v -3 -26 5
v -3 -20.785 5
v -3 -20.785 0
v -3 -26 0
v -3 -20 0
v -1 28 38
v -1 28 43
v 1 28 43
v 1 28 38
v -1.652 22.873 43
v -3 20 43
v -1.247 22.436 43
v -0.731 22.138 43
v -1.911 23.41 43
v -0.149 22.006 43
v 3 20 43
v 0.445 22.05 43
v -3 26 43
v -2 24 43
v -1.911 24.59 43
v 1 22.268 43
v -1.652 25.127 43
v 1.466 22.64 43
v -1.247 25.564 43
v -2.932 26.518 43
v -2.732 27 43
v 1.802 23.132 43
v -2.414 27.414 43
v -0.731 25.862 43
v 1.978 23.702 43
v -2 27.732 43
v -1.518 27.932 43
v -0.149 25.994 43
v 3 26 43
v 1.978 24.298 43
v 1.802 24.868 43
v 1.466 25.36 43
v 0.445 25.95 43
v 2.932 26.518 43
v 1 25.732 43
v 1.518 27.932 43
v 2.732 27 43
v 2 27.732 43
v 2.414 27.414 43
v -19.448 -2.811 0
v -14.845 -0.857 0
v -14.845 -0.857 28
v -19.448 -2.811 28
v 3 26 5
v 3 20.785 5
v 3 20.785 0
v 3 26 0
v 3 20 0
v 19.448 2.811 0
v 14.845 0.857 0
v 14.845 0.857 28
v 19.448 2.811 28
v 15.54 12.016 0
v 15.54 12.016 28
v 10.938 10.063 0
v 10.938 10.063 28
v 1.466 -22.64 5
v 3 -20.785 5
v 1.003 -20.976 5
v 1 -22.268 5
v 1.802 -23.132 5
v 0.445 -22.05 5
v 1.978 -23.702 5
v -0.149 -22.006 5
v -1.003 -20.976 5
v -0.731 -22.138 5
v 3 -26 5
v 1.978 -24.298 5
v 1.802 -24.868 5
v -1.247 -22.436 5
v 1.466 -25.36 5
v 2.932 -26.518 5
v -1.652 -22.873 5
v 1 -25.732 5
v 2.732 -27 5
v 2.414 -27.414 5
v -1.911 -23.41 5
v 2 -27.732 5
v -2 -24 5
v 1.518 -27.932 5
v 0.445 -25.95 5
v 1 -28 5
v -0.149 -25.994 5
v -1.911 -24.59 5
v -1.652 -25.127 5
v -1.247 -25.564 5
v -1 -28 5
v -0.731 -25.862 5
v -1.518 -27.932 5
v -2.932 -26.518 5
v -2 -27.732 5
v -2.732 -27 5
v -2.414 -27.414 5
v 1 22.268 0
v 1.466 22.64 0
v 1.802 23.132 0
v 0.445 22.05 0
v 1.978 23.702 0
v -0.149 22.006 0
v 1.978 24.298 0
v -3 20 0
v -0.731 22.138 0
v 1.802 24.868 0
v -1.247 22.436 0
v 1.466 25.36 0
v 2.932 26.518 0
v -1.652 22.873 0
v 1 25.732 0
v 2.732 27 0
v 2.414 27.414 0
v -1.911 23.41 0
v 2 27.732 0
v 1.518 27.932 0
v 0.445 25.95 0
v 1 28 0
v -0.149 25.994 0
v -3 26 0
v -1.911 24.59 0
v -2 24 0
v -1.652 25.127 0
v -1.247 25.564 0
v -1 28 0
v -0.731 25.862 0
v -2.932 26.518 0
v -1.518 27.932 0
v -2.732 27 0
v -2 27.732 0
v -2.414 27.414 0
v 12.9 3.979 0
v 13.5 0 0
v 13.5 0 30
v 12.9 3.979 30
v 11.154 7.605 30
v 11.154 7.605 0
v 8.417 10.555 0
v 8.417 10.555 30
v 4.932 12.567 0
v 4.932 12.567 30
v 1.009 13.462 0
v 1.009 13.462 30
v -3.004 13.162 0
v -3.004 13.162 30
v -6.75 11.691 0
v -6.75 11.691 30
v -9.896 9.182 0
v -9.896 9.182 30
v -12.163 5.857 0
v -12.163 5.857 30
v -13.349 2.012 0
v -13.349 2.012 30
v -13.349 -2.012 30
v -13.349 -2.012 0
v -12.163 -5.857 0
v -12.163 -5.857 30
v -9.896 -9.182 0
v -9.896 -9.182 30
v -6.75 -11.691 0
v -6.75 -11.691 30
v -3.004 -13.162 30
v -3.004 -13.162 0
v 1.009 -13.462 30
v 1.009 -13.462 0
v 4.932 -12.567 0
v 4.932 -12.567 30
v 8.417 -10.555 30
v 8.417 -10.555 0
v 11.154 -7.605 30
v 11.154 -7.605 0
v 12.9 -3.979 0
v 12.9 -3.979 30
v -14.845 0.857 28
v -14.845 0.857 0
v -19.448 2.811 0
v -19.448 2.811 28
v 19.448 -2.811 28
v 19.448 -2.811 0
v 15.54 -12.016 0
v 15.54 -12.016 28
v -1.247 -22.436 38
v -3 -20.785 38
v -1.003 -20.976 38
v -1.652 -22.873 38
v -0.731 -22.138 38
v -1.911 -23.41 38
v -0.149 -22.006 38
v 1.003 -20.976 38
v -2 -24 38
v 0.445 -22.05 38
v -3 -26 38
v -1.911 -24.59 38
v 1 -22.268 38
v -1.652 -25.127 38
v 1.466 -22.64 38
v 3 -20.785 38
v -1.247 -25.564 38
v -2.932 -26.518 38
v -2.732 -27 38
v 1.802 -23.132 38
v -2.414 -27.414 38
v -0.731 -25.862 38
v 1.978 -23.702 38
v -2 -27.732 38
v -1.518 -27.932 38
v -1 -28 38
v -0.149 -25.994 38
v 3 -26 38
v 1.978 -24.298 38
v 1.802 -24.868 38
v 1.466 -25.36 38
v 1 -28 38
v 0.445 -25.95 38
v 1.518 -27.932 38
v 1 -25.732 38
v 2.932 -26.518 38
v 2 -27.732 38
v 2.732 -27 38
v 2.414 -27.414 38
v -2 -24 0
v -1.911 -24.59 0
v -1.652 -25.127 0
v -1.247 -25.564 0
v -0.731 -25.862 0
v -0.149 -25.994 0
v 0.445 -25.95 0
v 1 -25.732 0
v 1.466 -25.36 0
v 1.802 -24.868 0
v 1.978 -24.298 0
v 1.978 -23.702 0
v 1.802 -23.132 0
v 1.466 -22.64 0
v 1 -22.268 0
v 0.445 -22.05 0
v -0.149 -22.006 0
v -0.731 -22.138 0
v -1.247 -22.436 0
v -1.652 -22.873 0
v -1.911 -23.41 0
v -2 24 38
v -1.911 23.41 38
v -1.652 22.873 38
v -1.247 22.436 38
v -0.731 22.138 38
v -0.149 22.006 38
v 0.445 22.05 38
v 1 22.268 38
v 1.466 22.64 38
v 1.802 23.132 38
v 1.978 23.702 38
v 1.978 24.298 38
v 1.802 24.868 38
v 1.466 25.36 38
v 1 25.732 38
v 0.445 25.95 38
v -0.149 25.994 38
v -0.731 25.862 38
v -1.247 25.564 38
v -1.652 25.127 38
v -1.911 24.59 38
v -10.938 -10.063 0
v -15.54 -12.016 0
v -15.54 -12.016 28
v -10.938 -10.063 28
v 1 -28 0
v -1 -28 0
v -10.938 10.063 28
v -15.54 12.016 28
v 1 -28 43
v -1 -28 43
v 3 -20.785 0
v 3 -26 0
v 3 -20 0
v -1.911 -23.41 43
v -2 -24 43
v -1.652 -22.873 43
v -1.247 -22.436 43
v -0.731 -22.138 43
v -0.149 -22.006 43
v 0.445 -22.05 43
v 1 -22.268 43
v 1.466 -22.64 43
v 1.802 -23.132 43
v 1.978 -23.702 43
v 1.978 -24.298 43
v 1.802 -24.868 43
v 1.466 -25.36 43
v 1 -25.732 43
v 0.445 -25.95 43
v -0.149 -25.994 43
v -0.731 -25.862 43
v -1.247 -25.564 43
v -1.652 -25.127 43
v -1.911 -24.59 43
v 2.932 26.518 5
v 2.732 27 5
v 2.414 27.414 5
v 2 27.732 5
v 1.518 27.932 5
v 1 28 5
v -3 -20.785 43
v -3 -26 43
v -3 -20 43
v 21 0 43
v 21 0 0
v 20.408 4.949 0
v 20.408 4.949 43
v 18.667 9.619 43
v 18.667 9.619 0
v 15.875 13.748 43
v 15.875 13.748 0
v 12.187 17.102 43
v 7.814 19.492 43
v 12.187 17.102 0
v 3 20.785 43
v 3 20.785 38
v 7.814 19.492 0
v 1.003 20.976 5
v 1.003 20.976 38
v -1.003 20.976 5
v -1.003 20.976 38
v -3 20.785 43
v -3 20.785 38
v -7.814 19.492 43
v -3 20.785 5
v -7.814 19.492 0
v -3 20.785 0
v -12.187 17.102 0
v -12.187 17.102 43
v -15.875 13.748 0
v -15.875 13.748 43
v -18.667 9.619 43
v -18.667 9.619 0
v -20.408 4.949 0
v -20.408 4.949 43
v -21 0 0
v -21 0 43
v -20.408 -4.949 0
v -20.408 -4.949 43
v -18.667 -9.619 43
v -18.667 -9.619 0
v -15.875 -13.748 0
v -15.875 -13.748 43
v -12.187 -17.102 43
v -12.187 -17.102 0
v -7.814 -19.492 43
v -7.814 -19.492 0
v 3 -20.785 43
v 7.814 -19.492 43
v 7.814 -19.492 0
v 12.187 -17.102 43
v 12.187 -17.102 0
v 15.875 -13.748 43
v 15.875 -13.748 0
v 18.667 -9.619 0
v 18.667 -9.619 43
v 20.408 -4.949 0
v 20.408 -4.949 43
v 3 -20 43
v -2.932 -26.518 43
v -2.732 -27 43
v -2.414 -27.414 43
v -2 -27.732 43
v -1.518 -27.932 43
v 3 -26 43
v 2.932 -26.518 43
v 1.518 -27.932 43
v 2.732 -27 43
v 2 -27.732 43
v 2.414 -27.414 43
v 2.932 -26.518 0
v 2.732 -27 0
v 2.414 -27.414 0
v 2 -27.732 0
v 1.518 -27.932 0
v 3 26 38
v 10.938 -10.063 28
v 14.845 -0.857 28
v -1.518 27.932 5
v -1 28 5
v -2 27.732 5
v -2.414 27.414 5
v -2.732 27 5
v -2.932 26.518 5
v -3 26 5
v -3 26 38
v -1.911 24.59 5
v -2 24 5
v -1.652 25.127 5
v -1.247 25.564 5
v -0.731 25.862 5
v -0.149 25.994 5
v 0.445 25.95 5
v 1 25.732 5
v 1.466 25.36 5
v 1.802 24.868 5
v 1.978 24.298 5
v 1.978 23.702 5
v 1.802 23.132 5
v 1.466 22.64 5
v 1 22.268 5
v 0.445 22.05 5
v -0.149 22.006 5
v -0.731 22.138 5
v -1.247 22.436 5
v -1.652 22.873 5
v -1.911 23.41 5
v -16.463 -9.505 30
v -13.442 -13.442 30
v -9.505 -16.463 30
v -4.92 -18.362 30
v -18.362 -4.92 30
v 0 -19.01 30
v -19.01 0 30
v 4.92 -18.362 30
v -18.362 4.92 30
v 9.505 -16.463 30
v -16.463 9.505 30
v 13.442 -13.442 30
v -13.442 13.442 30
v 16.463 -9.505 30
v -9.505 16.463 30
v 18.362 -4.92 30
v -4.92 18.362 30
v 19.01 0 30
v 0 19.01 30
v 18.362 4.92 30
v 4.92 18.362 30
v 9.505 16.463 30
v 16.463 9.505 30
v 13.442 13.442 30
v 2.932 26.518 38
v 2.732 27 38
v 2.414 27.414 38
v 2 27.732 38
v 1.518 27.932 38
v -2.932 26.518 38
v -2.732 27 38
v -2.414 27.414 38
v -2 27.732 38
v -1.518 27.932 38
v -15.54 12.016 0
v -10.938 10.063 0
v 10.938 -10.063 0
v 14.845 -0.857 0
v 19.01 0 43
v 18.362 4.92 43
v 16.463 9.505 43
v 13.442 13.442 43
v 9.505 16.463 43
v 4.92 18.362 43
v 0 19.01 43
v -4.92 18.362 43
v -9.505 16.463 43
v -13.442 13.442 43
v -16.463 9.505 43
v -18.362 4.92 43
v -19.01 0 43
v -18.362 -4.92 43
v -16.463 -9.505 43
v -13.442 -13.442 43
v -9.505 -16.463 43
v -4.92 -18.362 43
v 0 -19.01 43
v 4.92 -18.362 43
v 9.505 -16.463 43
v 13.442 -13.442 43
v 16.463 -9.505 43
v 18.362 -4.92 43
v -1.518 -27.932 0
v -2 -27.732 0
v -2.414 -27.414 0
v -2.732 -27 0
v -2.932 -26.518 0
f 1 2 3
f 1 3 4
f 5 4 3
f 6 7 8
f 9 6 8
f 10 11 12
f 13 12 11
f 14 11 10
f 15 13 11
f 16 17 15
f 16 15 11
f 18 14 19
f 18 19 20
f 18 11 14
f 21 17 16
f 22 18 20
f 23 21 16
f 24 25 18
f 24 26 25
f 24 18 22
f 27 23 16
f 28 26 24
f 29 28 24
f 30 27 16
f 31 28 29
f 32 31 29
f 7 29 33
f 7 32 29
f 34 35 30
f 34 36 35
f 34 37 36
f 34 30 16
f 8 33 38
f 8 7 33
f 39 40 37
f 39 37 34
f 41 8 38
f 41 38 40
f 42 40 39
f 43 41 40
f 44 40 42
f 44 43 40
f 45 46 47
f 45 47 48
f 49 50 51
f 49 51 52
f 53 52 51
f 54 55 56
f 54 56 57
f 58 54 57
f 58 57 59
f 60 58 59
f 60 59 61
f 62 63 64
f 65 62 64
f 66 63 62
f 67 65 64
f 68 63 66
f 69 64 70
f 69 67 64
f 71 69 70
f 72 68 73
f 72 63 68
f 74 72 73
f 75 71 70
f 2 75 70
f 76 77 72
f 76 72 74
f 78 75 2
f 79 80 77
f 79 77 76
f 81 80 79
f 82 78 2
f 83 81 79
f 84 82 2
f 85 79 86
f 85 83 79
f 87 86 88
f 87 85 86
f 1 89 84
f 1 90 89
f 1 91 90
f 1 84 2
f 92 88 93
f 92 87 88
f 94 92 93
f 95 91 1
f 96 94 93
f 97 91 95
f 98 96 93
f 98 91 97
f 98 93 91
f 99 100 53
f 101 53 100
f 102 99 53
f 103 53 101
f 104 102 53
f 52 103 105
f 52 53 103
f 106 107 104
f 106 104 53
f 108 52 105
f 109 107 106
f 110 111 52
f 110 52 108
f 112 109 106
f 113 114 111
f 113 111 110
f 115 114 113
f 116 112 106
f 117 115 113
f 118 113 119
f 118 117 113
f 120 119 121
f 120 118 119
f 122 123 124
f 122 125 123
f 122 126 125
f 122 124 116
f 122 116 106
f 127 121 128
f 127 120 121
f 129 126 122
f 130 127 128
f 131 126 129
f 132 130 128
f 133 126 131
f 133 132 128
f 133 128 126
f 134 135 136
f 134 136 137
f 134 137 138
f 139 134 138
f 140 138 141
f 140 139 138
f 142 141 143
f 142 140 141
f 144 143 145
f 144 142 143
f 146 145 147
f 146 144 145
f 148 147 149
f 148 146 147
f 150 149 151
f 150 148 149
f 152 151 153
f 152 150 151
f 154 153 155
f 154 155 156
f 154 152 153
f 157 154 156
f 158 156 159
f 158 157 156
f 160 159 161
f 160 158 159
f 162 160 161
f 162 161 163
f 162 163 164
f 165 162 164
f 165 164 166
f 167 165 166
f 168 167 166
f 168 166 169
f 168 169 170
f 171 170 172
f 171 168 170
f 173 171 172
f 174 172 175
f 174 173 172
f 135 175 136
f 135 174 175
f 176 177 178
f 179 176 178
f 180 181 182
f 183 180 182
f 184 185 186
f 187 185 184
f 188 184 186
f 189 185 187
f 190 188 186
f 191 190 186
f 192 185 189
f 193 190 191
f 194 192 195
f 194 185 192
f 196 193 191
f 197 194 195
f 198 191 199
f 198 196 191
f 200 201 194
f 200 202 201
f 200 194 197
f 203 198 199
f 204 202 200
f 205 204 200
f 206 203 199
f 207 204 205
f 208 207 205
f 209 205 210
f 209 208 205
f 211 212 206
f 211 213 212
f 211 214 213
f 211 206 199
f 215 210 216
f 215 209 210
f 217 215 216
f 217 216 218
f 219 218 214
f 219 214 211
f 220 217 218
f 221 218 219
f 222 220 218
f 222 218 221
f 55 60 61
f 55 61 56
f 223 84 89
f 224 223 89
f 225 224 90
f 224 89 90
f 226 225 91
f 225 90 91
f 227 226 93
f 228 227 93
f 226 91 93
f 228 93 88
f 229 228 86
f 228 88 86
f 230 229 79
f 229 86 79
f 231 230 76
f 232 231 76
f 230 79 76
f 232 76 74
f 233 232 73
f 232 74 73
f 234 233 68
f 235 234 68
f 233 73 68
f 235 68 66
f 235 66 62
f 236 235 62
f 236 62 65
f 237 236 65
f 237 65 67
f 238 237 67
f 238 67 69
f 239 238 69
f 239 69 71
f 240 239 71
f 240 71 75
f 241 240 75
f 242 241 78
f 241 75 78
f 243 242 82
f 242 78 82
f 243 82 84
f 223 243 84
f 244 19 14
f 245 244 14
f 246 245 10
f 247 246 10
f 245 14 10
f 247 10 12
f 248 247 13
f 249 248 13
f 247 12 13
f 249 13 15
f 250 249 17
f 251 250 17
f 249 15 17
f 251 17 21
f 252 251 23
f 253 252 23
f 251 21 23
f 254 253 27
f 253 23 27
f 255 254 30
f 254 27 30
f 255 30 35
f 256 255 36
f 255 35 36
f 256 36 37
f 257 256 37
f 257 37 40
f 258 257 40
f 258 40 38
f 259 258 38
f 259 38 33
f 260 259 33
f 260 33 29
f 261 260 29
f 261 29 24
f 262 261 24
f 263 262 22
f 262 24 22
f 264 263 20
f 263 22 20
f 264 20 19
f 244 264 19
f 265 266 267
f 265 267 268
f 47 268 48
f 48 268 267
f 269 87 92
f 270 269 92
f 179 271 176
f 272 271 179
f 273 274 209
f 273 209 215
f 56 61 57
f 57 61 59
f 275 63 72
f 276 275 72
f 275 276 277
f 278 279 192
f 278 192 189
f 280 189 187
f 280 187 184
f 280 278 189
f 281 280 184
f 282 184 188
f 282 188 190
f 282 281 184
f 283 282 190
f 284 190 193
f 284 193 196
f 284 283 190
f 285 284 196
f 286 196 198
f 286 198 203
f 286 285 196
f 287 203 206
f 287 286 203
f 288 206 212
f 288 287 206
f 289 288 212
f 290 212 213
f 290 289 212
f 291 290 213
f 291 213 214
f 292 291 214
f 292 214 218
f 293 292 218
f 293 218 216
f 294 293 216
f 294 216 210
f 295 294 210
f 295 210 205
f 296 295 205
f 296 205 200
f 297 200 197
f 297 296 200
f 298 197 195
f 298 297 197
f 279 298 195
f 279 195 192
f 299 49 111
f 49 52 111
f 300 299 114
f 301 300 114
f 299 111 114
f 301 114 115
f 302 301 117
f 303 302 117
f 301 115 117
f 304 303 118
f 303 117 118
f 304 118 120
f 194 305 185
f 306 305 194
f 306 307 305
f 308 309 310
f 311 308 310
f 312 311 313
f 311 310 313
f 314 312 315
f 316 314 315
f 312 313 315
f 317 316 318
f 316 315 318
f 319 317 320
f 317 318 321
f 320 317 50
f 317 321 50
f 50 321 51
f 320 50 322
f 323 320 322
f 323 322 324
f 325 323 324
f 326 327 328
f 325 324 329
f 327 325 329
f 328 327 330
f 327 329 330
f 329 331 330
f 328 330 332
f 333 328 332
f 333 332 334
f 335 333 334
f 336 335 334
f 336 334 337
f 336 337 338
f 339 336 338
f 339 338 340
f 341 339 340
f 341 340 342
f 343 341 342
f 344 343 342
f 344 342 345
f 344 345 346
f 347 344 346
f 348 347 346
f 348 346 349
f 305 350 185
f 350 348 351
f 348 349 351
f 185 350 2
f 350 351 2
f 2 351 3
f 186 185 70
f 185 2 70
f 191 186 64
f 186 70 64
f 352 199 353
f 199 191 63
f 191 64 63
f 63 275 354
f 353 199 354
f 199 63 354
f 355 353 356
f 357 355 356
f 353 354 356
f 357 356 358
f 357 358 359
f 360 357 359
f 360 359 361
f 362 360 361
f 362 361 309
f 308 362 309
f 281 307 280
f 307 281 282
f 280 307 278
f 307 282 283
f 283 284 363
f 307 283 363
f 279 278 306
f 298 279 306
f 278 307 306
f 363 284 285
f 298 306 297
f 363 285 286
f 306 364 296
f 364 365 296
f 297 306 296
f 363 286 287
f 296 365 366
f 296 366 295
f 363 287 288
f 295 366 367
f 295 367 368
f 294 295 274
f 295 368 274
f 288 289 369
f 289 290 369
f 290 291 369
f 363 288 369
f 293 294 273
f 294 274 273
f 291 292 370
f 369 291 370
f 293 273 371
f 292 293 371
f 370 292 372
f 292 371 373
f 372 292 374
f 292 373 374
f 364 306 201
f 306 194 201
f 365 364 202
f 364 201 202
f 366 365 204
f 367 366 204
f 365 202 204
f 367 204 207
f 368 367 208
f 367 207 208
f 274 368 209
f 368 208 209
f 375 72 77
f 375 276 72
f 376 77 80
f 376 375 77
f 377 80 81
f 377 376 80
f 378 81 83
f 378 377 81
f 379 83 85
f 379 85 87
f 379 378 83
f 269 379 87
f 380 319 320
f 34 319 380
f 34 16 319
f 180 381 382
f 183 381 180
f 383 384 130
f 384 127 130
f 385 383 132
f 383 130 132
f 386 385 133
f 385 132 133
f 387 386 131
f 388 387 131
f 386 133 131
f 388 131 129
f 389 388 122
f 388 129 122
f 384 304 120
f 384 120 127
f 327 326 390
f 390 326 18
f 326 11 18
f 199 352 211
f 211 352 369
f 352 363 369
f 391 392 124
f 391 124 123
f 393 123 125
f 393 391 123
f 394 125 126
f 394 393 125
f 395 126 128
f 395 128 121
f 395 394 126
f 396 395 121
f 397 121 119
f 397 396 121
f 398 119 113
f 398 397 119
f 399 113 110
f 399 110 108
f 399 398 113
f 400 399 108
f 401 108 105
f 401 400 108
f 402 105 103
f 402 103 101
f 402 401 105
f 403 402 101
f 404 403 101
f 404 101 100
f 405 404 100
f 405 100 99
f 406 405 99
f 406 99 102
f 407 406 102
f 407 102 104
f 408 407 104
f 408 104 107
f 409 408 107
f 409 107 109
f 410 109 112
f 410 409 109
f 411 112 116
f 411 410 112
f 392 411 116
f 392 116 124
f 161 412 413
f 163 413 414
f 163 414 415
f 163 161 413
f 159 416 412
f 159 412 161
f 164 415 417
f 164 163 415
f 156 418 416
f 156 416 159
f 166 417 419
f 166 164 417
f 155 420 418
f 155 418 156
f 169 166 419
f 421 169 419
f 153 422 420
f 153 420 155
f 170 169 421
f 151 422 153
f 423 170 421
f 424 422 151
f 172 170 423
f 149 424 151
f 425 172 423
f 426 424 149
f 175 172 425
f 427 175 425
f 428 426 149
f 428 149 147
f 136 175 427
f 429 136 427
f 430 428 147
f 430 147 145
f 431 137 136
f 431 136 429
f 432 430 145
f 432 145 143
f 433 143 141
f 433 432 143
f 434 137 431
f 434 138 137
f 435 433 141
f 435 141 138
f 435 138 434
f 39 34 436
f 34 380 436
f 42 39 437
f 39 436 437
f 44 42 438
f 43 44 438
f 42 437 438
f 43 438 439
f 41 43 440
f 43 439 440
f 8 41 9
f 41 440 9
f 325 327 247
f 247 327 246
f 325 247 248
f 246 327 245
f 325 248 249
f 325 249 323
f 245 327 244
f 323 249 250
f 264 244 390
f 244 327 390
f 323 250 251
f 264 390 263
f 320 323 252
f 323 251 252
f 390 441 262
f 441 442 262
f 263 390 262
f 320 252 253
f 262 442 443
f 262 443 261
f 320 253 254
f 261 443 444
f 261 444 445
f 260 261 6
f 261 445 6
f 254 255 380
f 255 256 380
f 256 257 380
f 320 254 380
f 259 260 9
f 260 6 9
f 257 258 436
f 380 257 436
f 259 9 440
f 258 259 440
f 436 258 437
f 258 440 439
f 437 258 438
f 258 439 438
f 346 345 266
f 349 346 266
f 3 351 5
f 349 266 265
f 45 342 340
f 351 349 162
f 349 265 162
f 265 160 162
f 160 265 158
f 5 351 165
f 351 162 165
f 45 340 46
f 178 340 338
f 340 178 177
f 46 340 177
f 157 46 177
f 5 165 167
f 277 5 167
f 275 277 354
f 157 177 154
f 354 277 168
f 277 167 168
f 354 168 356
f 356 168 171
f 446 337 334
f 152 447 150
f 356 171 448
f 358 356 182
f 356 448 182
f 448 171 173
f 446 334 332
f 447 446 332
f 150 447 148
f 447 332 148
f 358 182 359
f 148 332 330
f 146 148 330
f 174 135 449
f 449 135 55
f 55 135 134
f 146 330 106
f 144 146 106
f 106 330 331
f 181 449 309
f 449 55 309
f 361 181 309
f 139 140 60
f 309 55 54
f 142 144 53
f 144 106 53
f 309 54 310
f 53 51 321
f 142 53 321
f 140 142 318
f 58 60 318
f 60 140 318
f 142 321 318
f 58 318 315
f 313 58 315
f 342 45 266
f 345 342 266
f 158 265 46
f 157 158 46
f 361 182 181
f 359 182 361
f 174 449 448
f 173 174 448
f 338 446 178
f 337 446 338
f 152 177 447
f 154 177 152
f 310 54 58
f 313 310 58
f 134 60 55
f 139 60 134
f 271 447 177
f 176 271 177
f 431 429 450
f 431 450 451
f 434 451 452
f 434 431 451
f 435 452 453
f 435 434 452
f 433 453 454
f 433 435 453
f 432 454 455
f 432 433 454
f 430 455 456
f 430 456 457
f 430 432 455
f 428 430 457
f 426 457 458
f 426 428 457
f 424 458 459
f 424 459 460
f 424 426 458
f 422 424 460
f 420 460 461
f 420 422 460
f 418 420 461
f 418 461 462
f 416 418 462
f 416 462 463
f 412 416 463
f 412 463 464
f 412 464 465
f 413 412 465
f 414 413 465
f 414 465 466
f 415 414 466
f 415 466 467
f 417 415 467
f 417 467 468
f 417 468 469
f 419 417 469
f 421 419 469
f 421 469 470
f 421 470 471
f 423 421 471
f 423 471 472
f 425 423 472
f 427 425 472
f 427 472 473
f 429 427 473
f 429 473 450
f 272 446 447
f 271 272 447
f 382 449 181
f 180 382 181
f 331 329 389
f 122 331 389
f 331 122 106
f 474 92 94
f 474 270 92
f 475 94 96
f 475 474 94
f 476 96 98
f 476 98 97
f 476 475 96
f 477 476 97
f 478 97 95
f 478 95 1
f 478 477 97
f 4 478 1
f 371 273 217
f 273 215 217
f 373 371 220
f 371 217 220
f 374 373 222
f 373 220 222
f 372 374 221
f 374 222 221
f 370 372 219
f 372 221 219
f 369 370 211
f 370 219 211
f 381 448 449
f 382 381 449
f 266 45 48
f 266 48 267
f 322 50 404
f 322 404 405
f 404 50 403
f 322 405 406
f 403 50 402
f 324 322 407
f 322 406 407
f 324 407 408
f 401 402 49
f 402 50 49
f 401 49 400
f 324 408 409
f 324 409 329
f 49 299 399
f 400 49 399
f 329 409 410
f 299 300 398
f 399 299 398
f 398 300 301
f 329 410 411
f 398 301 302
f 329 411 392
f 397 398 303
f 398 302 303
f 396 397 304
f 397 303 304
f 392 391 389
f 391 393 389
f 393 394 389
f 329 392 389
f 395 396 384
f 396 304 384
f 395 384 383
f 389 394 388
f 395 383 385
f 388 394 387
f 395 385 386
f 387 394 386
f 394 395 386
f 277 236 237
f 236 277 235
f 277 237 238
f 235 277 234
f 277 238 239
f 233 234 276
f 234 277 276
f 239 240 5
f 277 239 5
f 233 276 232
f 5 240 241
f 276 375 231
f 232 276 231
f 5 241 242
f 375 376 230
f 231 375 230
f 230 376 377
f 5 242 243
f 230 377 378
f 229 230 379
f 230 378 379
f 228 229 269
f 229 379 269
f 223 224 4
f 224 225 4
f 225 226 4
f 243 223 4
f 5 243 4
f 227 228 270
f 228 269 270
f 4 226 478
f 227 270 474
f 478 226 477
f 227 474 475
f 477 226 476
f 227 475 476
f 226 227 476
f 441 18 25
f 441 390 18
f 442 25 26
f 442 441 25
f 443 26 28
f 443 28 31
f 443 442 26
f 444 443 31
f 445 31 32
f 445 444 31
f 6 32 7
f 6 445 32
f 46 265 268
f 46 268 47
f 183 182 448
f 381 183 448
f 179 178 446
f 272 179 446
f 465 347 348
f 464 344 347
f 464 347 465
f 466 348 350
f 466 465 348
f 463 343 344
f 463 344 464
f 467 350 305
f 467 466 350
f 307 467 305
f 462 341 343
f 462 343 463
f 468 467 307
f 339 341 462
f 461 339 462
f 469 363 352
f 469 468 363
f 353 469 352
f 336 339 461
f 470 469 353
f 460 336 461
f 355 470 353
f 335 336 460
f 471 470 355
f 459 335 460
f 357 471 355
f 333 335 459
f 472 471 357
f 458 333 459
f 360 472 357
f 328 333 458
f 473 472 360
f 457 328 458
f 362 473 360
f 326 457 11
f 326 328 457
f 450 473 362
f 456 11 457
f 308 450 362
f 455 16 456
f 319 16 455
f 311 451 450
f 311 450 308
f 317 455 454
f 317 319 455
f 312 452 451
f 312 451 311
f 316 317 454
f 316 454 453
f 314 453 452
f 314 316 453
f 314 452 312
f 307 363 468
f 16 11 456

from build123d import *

# Parameters (mm, degrees)
SKETCH1_R                = 19.01
SKETCH1_R_2              = 13.5
BOSS_EXTRUDE1_DEPTH      = 30
BOSS_EXTRUDE2_DEPTH      = 13
BOSS_EXTRUDE2_DEPTH_BACK = 30
SKETCH2_R                = 21
SKETCH2_R_2              = 19.01
CUT_EXTRUDE1_DEPTH       = 28
MIRROR2_COPY_1_DEPTH     = 28
BOSS_EXTRUDE3_START      = -5
SKETCH4_W                = 6
SKETCH4_H                = 8
SKETCH4_R                = 2
BOSS_EXTRUDE3_DEPTH      = 5.0001
FILLET1_R                = 2
FILLET1_OF_MIRROR5_R     = 2
BOSS_EXTRUDE6_START      = 0.0001
SKETCH7_W                = 6
SKETCH7_H                = 8
SKETCH7_R                = 2
BOSS_EXTRUDE6_DEPTH      = 5.0001
FILLET2_R                = 2


with BuildPart() as part:
    # Sketch1 → Boss-Extrude1 (new body)
    with BuildSketch(Plane.XY):
        Circle(SKETCH1_R)
        Circle(SKETCH1_R_2, mode=Mode.SUBTRACT)
    extrude(amount=BOSS_EXTRUDE1_DEPTH)

    # Sketch2 → Boss-Extrude2 (add, two sides: drawn at the far end of the back side and taken through both)
    with BuildSketch(Plane.XY.offset(30).offset(-BOSS_EXTRUDE2_DEPTH_BACK)):
        Circle(SKETCH2_R)
        Circle(SKETCH2_R_2, mode=Mode.SUBTRACT)
    extrude(amount=BOSS_EXTRUDE2_DEPTH + BOSS_EXTRUDE2_DEPTH_BACK)

    # Sketch3 → Cut-Extrude1 (cut)
    with BuildSketch(Plane(origin=(0, 0, 0), x_dir=(-1, 0, 0), z_dir=(0, 0, -1))):
        Polygon((15.540276616, 12.01617991), (10.937752349, 10.062524267), (14.845063634, 0.857475733), (19.447587901, 2.811131375), align=None)
    cut_extrude1 = extrude(amount=-CUT_EXTRUDE1_DEPTH, mode=Mode.SUBTRACT)

    # Mirror1: Cut-Extrude1 across plane
    add(cut_extrude1.mirror(Plane.ZX), mode=Mode.SUBTRACT)

    # Mirror2: Cut-Extrude1 across plane
    add(cut_extrude1.mirror(Plane(origin=(0, 0, 0), x_dir=(0, 0, 1), z_dir=(1, 0, 0))), mode=Mode.SUBTRACT)

    # Mirror2 copy 1 sketch → Mirror2 copy 1 (cut)
    with BuildSketch(Plane(origin=(0, 0, 0), x_dir=(1, 0, 0), z_dir=(0, 0, -1))):
        Polygon((15.540276616, 12.01617991), (10.937752349, 10.062524267), (14.845063634, 0.857475733), (19.447587901, 2.811131375), align=None)
    extrude(amount=-MIRROR2_COPY_1_DEPTH, mode=Mode.SUBTRACT)

    # Sketch4 → Boss-Extrude3 (add)
    with BuildSketch(Plane(origin=(0, 0, 0), x_dir=(-1, 0, 0), z_dir=(0, 0, -1)).offset(BOSS_EXTRUDE3_START)):
        with Locations((0, 24)):
            Rectangle(SKETCH4_W, SKETCH4_H)
        with Locations((0, 24)):
            Circle(SKETCH4_R, mode=Mode.SUBTRACT)
    boss_extrude3 = extrude(amount=BOSS_EXTRUDE3_DEPTH)

    # Fillet1
    fillet1_edges = [part.edges().sort_by_distance(p)[0] for p in [
        (-3, 28, 2.49995),
        (3, 28, 2.49995),
    ]]
    fillet(fillet1_edges, radius=FILLET1_R)

    # Mirror5: Boss-Extrude3 across plane
    add(boss_extrude3.mirror(Plane.ZX))

    # Fillet1 of Mirror5
    fillet1_of_mirror5_edges = [part.edges().sort_by_distance(p)[0] for p in [
        (-3, -28, 2.49995),
        (3, -28, 2.49995),
    ]]
    fillet(fillet1_of_mirror5_edges, radius=FILLET1_OF_MIRROR5_R)

    # Sketch7 → Boss-Extrude6 (add)
    with BuildSketch(Plane.XY.offset(43).offset(BOSS_EXTRUDE6_START)):
        with Locations((0, 24)):
            Rectangle(SKETCH7_W, SKETCH7_H)
        with Locations(Location((0, 24, 0), (0, 0, 180))):
            Circle(SKETCH7_R, mode=Mode.SUBTRACT)
    boss_extrude6 = extrude(amount=-BOSS_EXTRUDE6_DEPTH)

    # Mirror6: Boss-Extrude6 across plane
    add(boss_extrude6.mirror(Plane.ZX))

    # Fillet2
    fillet2_edges = [part.edges().sort_by_distance(p)[0] for p in [
        (-3, 28, 40.50005),
        (3, 28, 40.50005),
        (-3, -28, 40.50005),
        (3, -28, 40.50005),
    ]]
    fillet(fillet2_edges, radius=FILLET2_R)


solid = part.part
